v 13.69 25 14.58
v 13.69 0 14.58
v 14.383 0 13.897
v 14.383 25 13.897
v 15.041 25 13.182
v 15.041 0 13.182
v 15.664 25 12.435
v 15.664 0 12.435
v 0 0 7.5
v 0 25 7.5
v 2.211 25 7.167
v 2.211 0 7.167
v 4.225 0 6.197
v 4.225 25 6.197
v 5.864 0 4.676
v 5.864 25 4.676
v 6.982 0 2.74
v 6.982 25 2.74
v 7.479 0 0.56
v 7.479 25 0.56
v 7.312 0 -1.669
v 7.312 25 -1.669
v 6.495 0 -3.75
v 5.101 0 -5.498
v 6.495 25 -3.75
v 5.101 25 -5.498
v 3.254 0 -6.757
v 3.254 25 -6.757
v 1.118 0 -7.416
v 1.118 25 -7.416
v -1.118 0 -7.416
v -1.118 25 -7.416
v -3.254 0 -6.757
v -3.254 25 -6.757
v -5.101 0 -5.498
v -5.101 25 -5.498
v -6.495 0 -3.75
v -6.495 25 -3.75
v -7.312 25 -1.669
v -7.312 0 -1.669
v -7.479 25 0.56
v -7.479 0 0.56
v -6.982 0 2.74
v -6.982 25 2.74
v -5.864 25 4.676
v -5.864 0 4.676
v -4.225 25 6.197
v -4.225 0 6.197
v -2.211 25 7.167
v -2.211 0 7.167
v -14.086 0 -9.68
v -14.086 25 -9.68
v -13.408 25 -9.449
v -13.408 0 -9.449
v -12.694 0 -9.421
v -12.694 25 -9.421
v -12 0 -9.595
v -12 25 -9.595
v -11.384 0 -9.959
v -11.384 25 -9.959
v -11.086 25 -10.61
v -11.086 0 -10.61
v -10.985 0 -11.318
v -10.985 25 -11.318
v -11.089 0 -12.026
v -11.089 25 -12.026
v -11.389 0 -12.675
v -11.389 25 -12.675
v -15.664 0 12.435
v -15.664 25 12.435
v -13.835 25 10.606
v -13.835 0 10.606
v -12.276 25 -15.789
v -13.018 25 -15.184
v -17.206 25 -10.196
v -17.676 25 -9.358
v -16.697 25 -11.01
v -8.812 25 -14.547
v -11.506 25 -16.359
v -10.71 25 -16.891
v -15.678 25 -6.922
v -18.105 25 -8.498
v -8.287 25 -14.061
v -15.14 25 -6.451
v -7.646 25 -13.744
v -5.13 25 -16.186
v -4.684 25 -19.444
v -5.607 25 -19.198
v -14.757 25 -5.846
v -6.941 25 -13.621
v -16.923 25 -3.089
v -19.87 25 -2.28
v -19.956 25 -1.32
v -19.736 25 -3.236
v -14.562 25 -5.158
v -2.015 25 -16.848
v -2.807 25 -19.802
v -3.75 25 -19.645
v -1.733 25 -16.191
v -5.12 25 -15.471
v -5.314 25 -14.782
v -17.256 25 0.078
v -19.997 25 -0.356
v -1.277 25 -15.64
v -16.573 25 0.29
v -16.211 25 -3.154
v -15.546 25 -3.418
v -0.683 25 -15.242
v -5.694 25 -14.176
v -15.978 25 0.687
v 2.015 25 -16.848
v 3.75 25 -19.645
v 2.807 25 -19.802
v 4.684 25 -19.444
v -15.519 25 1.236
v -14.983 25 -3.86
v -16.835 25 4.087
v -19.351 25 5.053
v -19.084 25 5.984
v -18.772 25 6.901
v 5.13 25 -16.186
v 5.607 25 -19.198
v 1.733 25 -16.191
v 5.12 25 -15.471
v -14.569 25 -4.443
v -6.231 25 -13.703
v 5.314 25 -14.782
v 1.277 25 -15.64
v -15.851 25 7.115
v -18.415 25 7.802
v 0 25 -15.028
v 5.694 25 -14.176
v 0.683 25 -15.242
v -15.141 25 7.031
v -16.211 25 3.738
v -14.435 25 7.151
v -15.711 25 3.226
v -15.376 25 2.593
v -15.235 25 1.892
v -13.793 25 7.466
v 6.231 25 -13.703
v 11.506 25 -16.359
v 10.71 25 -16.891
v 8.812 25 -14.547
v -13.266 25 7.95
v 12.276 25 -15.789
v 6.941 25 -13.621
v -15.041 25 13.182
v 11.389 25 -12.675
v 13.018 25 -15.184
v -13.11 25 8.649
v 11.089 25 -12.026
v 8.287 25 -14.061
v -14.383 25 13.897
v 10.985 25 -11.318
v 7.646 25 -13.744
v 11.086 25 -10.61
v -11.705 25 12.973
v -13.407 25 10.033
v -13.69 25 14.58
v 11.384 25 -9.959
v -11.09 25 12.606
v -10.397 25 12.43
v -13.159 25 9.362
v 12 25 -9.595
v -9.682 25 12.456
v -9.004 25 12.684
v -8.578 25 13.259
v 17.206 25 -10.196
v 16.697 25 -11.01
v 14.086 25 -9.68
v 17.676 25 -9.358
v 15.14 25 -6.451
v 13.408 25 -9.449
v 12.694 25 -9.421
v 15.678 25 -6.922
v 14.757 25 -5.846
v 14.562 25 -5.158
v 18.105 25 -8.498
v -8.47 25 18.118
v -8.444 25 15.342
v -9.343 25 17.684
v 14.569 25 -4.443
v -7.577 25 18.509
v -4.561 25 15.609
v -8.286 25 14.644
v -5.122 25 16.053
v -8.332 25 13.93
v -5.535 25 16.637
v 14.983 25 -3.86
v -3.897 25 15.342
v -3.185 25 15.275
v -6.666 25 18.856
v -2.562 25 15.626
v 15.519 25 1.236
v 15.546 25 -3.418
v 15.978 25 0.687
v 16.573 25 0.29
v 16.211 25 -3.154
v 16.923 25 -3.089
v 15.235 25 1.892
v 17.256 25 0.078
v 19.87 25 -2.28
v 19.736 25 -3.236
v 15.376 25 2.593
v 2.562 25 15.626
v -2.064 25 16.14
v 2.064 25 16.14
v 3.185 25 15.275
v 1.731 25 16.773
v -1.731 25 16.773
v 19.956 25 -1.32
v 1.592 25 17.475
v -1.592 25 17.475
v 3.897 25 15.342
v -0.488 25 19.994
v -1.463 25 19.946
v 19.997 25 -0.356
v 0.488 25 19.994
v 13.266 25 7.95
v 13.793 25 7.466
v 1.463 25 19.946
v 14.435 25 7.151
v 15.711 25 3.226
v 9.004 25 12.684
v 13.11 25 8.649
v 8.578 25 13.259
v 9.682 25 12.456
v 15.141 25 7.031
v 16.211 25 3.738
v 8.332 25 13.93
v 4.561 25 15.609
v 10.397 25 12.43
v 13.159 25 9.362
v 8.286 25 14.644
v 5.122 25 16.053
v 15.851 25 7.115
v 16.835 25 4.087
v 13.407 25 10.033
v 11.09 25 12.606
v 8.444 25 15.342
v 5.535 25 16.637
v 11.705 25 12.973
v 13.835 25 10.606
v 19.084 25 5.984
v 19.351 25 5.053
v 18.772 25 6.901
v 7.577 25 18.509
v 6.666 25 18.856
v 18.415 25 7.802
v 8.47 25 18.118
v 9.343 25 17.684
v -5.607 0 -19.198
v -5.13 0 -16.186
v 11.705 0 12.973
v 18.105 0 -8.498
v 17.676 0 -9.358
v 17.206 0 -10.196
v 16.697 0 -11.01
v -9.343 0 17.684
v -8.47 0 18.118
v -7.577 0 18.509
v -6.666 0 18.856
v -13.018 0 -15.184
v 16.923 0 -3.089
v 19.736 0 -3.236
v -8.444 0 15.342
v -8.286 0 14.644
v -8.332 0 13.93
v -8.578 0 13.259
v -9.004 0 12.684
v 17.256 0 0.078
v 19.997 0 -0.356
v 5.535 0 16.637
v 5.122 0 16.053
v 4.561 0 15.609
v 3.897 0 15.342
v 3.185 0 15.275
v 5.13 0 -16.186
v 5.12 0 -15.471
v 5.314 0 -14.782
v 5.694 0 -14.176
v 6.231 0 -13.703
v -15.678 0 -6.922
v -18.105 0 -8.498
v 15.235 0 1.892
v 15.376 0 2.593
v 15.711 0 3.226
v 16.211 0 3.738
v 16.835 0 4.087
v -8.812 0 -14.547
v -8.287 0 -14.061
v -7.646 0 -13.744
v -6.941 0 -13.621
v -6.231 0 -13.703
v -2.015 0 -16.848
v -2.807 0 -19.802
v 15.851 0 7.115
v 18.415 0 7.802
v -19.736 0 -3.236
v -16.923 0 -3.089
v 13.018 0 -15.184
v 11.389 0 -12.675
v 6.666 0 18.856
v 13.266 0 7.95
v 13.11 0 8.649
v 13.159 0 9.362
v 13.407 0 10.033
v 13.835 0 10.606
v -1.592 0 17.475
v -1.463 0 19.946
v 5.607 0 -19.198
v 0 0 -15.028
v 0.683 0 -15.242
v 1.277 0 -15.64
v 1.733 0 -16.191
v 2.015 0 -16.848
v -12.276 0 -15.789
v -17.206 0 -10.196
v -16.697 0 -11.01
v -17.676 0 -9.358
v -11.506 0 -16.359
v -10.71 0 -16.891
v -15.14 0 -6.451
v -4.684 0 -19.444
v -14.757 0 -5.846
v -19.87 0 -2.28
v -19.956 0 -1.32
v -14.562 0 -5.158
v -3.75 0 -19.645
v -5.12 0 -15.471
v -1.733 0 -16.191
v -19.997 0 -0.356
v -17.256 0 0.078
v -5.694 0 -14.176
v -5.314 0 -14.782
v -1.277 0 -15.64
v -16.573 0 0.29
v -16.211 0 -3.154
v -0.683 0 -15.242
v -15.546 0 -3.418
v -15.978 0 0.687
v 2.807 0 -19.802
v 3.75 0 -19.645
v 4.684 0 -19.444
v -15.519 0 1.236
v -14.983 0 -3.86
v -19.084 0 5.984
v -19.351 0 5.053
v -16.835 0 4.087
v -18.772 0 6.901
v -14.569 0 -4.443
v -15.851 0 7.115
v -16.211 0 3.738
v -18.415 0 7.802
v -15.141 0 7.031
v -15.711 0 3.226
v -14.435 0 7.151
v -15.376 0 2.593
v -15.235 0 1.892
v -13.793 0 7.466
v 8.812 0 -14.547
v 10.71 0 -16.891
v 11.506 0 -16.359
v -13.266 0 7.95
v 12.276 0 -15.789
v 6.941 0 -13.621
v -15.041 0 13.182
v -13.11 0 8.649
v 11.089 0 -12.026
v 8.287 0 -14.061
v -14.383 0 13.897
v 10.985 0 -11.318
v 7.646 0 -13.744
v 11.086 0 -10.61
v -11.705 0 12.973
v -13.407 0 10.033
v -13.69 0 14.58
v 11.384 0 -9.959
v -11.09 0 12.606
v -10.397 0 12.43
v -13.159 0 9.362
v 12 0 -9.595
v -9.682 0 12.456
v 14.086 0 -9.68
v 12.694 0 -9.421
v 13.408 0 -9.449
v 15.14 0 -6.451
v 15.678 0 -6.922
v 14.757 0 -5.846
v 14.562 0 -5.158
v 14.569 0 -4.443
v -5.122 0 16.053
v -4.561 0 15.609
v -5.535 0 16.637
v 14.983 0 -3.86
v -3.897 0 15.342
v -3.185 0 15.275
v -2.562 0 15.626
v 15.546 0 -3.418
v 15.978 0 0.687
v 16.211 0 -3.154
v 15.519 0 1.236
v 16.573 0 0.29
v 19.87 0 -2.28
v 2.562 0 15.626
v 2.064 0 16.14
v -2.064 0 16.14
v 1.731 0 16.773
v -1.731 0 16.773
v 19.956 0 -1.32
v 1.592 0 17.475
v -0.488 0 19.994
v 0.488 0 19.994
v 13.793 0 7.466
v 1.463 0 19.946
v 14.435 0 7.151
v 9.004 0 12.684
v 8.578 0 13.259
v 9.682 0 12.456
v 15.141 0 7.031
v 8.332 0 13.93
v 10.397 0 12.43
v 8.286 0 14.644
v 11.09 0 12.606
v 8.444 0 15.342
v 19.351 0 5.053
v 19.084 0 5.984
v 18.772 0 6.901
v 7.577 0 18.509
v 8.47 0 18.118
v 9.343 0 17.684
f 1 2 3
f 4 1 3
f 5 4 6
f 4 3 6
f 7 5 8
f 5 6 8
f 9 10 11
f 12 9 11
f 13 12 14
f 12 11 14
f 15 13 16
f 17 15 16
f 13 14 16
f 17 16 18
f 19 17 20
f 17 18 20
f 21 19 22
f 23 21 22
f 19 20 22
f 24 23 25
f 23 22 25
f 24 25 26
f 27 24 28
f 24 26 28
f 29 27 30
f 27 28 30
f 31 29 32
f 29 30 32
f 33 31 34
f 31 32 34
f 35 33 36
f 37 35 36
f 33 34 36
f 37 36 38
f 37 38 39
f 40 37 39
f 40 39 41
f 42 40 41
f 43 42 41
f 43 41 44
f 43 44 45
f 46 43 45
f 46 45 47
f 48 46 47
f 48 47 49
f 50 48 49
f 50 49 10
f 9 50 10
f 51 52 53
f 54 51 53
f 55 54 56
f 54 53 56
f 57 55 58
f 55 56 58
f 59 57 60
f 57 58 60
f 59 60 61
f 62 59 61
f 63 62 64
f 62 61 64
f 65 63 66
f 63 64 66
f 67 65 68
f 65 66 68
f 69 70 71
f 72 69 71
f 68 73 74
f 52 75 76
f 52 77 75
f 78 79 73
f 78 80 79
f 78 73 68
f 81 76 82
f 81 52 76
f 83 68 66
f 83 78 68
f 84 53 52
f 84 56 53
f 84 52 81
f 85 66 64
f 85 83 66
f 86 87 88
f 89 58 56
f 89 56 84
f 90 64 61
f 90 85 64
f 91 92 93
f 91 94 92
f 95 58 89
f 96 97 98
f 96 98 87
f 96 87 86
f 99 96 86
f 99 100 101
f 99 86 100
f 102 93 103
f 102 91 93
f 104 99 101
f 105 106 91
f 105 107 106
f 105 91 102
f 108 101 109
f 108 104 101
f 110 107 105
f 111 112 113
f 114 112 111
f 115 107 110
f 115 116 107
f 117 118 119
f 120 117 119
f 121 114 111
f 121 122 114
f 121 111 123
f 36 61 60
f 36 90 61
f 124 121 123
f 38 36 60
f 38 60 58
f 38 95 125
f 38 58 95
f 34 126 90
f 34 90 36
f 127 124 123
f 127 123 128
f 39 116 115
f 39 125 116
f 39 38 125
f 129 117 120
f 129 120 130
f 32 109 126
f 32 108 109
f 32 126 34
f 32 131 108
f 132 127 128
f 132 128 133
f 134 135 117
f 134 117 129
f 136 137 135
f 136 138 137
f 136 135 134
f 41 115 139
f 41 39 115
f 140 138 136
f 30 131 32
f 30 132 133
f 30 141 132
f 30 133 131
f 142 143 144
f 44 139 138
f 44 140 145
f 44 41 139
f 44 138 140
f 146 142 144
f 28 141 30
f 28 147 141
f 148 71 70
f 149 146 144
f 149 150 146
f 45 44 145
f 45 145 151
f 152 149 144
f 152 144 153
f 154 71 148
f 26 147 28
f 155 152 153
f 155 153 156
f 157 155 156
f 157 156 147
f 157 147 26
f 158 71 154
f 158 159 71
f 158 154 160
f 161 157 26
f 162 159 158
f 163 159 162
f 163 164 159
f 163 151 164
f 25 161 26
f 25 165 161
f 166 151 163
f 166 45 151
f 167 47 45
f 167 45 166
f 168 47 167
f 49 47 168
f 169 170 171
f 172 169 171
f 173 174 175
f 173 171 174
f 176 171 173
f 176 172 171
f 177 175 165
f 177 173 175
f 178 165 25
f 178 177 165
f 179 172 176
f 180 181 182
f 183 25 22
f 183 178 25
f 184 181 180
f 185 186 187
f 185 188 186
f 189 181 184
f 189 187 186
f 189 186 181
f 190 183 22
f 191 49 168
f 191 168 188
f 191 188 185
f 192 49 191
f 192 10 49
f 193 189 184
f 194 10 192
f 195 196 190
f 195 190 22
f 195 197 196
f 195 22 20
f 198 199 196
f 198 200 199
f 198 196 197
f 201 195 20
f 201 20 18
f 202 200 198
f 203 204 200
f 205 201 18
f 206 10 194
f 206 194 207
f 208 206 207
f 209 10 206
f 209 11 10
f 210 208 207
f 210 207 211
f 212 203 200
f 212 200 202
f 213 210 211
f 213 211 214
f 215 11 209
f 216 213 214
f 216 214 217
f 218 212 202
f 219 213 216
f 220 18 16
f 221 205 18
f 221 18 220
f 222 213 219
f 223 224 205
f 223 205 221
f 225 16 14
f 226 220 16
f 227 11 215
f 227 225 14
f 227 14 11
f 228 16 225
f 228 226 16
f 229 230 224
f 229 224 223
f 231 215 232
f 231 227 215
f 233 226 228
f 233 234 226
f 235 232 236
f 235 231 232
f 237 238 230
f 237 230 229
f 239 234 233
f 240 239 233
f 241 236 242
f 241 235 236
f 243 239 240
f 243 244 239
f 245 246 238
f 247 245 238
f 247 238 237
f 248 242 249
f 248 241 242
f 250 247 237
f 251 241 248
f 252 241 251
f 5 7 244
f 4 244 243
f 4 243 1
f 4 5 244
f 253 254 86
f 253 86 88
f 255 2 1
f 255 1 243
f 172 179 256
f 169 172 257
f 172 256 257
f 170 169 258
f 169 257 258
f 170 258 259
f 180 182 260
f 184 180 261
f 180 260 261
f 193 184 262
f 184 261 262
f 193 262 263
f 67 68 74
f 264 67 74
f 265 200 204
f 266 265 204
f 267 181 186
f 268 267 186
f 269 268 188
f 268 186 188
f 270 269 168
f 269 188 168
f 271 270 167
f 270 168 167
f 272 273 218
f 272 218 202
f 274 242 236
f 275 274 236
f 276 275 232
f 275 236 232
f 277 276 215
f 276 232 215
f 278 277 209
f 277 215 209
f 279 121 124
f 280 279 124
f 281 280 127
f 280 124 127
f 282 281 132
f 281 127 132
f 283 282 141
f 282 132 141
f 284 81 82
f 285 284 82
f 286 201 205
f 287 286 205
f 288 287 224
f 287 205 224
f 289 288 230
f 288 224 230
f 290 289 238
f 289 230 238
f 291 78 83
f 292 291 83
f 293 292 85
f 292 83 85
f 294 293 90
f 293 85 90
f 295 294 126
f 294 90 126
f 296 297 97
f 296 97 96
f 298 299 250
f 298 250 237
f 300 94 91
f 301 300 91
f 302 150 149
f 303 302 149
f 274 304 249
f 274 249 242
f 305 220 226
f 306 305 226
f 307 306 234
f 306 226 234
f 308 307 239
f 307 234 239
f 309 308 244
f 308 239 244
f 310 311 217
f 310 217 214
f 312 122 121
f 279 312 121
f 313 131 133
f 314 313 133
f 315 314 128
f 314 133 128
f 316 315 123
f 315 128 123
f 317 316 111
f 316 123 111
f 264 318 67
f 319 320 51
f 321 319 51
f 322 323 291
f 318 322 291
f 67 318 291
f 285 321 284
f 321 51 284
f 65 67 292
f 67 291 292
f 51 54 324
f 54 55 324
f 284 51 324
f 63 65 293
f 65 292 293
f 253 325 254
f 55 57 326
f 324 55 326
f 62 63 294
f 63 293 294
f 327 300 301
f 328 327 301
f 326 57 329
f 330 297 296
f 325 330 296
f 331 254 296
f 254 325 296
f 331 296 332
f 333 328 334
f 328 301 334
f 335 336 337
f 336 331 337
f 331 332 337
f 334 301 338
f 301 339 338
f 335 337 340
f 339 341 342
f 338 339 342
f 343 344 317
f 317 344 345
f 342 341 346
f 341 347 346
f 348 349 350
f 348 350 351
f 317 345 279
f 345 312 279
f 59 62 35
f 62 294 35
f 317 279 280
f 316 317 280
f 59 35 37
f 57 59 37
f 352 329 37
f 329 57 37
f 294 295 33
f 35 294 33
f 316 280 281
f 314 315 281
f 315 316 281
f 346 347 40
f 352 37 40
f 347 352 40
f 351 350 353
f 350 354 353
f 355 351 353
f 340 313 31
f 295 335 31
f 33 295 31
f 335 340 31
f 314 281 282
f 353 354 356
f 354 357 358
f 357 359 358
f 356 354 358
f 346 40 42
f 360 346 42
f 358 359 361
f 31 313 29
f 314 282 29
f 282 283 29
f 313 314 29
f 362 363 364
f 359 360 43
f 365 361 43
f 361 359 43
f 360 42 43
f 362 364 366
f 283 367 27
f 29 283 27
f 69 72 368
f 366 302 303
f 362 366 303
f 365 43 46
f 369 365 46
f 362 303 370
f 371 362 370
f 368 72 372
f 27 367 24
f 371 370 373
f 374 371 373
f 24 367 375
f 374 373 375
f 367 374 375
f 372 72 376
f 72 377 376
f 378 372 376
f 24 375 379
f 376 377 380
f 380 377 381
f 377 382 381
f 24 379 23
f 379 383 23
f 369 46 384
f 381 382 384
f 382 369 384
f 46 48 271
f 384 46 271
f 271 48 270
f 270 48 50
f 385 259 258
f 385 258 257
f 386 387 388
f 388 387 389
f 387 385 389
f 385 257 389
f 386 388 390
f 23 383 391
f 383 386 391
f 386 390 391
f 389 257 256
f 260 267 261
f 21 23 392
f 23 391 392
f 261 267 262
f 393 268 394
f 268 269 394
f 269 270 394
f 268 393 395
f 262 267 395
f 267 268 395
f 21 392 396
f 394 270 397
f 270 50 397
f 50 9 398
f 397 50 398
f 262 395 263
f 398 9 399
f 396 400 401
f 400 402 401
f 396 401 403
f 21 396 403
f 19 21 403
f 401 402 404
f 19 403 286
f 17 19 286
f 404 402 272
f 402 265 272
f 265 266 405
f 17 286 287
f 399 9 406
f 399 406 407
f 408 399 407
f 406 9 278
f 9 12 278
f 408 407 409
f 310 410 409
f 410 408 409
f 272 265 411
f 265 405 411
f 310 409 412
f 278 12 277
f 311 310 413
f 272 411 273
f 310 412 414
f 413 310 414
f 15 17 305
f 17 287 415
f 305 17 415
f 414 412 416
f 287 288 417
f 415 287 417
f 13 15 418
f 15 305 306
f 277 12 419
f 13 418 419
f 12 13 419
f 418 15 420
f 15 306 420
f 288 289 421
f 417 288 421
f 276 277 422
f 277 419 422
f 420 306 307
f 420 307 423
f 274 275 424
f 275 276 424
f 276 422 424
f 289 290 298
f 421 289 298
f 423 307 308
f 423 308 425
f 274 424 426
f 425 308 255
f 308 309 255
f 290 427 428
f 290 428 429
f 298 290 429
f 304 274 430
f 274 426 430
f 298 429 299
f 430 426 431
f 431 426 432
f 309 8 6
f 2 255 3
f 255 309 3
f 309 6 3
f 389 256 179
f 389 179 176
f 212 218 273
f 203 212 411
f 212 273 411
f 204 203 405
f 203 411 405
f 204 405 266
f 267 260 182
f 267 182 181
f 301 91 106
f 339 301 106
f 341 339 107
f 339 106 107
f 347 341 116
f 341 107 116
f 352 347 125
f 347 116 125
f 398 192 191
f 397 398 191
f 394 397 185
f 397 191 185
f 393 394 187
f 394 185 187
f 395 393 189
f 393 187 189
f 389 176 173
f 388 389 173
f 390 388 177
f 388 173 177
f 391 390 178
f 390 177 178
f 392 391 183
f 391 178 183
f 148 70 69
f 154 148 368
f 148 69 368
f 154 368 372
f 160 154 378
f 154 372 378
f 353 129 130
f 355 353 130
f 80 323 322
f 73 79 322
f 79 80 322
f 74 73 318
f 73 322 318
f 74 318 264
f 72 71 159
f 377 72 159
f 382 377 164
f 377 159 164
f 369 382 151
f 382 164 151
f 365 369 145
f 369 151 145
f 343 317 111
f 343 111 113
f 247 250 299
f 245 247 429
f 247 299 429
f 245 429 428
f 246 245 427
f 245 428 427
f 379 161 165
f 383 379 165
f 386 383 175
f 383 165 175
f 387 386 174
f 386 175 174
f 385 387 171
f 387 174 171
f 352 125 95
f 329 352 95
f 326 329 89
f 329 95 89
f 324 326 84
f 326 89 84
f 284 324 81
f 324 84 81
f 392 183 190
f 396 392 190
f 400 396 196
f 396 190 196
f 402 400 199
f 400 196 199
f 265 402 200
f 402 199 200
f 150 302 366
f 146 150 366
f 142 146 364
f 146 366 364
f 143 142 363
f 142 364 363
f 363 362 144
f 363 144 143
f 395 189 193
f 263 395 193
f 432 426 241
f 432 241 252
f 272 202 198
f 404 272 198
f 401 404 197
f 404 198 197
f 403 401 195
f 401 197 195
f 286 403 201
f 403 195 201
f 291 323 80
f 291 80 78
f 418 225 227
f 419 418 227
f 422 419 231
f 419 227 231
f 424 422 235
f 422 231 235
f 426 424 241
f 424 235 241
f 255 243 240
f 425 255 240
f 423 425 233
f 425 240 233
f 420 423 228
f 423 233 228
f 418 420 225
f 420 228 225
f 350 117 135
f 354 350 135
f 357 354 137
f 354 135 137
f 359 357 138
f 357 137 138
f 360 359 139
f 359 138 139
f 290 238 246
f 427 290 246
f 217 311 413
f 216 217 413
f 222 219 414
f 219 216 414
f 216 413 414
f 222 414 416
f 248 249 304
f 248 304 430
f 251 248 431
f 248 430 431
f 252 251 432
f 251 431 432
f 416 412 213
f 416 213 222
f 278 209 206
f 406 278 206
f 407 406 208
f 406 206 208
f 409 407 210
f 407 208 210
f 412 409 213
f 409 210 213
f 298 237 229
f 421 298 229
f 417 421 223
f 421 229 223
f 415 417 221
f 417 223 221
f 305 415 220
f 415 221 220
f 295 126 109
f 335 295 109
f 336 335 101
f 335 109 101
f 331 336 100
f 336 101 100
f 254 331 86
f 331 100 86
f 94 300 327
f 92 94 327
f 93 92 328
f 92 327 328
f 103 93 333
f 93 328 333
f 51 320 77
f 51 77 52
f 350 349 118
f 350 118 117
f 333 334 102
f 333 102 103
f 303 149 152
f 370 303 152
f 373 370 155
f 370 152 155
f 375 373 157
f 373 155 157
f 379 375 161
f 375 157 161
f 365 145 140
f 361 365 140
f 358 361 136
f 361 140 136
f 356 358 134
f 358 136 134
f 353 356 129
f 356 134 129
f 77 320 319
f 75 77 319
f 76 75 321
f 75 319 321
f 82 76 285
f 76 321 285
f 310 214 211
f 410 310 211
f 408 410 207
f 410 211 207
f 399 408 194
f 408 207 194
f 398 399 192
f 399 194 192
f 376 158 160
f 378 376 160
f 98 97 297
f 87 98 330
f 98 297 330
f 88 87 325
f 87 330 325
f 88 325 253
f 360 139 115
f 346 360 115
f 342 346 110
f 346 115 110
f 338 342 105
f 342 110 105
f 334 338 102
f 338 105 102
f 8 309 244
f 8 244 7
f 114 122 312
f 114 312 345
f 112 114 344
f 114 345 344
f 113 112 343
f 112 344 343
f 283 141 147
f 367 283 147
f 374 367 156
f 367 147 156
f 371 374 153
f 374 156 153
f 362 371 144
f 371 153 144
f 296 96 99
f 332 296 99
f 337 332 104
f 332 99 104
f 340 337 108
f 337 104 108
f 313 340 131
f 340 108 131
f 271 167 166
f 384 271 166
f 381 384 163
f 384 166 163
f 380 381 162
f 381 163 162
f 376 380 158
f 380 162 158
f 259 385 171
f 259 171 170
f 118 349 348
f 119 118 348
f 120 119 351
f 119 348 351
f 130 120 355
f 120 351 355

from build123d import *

# Parameters (mm, degrees)
ESQUISSE1_R                  = 20
BOSS_EXTRU_1_DEPTH           = 25
ENL_V_MAT_EXTRU_1_REACH      = 39.749
R_P_TITION_CIRCULAIRE1_COUNT = 15
ENL_V_MAT_EXTRU_2_REACH      = 39.747
ESQUISSE5_R                  = 7.5


with BuildPart() as part:
    # Esquisse1 → Boss.-Extru.1 (new body)
    with BuildSketch(Plane(origin=(0, 0, 0), x_dir=(1, 0, 0), z_dir=(0, 1, 0))):
        with Locations(Location((0, 0, 0), (0, 0, 270))):
            Circle(ESQUISSE1_R)
    extrude(amount=BOSS_EXTRU_1_DEPTH)

    # Esquisse3 → Enlèv. mat.-Extru.1 (cut, up to next)
    with BuildSketch(Plane(origin=(0, 25, 0), x_dir=(1, 0, 0), z_dir=(0, 1, 0)), mode=Mode.PRIVATE) as enl_v_mat_extru_1_sk1:
        with BuildLine():
            ThreePointArc((2.80685469, 19.802059659), (0, 20), (-2.80685469, 19.802059659))
            Line((-2.80685469, 19.802059659), (-2.015422429, 16.848394249))
            ThreePointArc((-2.015422429, 16.848394249), (-1.276557591, 15.640396711), (0, 15.027550875))
            ThreePointArc((0, 15.027550875), (1.276557591, 15.640396711), (2.015422429, 16.848394249))
            Line((2.015422429, 16.848394249), (2.80685469, 19.802059659))
        make_face()
    enl_v_mat_extru_1_tool1 = extrude(enl_v_mat_extru_1_sk1.sketch, amount=-ENL_V_MAT_EXTRU_1_REACH, mode=Mode.PRIVATE) & part.part
    enl_v_mat_extru_1 = enl_v_mat_extru_1_tool1.solids().sort_by_distance((0, 25, -17.875874))[0]
    add(enl_v_mat_extru_1, mode=Mode.SUBTRACT)

    # Répétition circulaire1: Enlèv. mat.-Extru.1 ×15 about axis
    r_p_tition_circulaire1_axis = Axis((0, 0, 0.291044728), (0, 1, 0))
    for i in range(1, R_P_TITION_CIRCULAIRE1_COUNT):
        add(enl_v_mat_extru_1.rotate(r_p_tition_circulaire1_axis, i * 360 / R_P_TITION_CIRCULAIRE1_COUNT), mode=Mode.SUBTRACT)

    # Esquisse5 → Enlèv. mat.-Extru.2 (cut, up to next)
    with BuildSketch(Plane(origin=(0, 25, 0), x_dir=(1, 0, 0), z_dir=(0, 1, 0)), mode=Mode.PRIVATE) as enl_v_mat_extru_2_sk1:
        with Locations(Location((0, 0, 0), (0, 0, 270))):
            Circle(ESQUISSE5_R)
    enl_v_mat_extru_2_tool1 = extrude(enl_v_mat_extru_2_sk1.sketch, amount=-ENL_V_MAT_EXTRU_2_REACH, mode=Mode.PRIVATE) & part.part
    add(enl_v_mat_extru_2_tool1.solids().sort_by_distance((0, 25, 0))[0], mode=Mode.SUBTRACT)


solid = part.part
